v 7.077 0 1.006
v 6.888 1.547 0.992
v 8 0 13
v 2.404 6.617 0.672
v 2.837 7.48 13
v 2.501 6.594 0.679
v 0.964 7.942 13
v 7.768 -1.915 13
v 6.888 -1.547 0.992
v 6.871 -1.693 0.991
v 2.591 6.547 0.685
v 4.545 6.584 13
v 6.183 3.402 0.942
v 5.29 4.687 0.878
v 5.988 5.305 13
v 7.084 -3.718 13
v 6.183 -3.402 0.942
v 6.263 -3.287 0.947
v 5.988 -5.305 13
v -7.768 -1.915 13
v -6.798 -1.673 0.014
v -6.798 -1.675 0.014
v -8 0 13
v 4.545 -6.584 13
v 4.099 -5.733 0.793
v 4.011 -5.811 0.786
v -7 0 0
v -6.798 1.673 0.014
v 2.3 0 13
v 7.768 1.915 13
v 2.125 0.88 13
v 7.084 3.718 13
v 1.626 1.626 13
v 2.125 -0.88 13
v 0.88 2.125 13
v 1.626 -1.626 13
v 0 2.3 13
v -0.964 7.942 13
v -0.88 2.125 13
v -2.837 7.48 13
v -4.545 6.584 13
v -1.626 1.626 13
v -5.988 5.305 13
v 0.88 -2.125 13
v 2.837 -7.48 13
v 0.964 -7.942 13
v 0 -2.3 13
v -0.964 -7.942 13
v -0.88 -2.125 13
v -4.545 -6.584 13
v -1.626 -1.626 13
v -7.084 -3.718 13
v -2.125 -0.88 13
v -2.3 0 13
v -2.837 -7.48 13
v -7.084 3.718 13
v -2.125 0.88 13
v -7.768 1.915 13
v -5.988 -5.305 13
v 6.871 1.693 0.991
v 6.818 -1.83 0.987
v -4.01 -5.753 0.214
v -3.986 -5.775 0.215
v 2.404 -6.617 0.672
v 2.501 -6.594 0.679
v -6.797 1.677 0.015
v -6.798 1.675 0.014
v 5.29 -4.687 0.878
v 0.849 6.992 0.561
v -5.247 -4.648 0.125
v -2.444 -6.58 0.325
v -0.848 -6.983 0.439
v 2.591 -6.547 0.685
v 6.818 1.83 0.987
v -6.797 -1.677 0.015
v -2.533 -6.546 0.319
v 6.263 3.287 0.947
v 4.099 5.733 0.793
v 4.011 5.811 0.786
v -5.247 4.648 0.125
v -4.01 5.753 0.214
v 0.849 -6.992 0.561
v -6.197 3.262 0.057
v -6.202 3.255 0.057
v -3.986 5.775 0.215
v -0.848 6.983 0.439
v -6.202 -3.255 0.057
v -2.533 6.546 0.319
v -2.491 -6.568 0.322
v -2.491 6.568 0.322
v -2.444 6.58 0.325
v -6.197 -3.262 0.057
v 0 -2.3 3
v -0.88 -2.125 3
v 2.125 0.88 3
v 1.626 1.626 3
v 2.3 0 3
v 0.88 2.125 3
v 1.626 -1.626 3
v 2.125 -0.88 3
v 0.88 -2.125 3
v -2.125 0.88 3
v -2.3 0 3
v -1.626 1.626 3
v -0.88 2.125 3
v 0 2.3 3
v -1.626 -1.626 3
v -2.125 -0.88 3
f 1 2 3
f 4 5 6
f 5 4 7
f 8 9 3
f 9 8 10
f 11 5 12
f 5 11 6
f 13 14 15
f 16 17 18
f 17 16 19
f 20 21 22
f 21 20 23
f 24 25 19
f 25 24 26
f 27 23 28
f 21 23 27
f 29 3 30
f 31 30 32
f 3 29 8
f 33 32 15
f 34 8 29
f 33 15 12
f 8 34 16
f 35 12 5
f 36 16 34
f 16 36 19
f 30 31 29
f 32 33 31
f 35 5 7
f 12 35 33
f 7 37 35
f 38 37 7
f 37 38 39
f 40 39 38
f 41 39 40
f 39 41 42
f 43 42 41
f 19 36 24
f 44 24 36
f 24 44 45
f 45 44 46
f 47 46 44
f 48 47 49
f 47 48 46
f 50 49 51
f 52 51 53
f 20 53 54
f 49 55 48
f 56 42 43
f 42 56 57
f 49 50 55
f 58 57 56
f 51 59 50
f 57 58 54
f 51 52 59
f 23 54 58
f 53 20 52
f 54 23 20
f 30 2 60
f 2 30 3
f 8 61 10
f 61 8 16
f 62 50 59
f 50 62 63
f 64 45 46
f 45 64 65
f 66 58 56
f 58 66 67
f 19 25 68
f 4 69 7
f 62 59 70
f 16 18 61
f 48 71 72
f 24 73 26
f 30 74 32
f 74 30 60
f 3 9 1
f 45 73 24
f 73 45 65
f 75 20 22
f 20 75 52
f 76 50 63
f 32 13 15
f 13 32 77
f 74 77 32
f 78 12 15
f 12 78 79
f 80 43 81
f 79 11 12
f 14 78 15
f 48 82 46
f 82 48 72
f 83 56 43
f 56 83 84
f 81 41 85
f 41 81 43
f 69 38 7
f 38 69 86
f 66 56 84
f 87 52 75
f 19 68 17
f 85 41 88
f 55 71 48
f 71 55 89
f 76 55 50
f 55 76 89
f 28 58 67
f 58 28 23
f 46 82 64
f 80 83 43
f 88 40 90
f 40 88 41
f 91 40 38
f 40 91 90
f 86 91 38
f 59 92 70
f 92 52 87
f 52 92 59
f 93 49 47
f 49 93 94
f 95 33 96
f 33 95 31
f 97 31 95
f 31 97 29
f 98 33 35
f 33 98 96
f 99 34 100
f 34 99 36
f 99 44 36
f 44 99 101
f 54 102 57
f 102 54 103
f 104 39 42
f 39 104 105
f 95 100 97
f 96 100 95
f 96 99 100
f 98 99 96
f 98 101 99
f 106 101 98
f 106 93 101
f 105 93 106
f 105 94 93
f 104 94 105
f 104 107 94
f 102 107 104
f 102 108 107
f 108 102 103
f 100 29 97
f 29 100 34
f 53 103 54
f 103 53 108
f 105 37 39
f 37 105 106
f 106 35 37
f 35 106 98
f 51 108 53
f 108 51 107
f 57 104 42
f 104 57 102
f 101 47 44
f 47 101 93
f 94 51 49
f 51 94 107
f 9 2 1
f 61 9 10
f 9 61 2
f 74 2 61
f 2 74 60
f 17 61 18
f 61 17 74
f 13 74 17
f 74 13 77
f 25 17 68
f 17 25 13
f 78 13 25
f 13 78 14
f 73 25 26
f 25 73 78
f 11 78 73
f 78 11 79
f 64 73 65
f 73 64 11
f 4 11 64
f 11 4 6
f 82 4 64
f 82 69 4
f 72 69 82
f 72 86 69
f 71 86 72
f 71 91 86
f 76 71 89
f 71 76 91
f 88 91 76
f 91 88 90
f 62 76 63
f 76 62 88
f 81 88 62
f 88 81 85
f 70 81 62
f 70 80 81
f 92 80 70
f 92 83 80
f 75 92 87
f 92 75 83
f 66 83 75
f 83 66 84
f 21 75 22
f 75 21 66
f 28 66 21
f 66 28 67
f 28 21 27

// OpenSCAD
// a tilt of 1 and 4 mm with a height of 12 produces legs that allow the case to sit flat on the table
tilt = 1;
height = 12;

difference() {
    cylinder(r1=7, r2=8, h=height + tilt);
    translate([0, 0, 3]) cylinder(r=2.3, h=20, $fn=16);
    
    translate([-7, 0, 0]) rotate([0, -atan(tilt/14), 0]) translate([0, -10, -20]) #cube([20, 20, 20]);
}
